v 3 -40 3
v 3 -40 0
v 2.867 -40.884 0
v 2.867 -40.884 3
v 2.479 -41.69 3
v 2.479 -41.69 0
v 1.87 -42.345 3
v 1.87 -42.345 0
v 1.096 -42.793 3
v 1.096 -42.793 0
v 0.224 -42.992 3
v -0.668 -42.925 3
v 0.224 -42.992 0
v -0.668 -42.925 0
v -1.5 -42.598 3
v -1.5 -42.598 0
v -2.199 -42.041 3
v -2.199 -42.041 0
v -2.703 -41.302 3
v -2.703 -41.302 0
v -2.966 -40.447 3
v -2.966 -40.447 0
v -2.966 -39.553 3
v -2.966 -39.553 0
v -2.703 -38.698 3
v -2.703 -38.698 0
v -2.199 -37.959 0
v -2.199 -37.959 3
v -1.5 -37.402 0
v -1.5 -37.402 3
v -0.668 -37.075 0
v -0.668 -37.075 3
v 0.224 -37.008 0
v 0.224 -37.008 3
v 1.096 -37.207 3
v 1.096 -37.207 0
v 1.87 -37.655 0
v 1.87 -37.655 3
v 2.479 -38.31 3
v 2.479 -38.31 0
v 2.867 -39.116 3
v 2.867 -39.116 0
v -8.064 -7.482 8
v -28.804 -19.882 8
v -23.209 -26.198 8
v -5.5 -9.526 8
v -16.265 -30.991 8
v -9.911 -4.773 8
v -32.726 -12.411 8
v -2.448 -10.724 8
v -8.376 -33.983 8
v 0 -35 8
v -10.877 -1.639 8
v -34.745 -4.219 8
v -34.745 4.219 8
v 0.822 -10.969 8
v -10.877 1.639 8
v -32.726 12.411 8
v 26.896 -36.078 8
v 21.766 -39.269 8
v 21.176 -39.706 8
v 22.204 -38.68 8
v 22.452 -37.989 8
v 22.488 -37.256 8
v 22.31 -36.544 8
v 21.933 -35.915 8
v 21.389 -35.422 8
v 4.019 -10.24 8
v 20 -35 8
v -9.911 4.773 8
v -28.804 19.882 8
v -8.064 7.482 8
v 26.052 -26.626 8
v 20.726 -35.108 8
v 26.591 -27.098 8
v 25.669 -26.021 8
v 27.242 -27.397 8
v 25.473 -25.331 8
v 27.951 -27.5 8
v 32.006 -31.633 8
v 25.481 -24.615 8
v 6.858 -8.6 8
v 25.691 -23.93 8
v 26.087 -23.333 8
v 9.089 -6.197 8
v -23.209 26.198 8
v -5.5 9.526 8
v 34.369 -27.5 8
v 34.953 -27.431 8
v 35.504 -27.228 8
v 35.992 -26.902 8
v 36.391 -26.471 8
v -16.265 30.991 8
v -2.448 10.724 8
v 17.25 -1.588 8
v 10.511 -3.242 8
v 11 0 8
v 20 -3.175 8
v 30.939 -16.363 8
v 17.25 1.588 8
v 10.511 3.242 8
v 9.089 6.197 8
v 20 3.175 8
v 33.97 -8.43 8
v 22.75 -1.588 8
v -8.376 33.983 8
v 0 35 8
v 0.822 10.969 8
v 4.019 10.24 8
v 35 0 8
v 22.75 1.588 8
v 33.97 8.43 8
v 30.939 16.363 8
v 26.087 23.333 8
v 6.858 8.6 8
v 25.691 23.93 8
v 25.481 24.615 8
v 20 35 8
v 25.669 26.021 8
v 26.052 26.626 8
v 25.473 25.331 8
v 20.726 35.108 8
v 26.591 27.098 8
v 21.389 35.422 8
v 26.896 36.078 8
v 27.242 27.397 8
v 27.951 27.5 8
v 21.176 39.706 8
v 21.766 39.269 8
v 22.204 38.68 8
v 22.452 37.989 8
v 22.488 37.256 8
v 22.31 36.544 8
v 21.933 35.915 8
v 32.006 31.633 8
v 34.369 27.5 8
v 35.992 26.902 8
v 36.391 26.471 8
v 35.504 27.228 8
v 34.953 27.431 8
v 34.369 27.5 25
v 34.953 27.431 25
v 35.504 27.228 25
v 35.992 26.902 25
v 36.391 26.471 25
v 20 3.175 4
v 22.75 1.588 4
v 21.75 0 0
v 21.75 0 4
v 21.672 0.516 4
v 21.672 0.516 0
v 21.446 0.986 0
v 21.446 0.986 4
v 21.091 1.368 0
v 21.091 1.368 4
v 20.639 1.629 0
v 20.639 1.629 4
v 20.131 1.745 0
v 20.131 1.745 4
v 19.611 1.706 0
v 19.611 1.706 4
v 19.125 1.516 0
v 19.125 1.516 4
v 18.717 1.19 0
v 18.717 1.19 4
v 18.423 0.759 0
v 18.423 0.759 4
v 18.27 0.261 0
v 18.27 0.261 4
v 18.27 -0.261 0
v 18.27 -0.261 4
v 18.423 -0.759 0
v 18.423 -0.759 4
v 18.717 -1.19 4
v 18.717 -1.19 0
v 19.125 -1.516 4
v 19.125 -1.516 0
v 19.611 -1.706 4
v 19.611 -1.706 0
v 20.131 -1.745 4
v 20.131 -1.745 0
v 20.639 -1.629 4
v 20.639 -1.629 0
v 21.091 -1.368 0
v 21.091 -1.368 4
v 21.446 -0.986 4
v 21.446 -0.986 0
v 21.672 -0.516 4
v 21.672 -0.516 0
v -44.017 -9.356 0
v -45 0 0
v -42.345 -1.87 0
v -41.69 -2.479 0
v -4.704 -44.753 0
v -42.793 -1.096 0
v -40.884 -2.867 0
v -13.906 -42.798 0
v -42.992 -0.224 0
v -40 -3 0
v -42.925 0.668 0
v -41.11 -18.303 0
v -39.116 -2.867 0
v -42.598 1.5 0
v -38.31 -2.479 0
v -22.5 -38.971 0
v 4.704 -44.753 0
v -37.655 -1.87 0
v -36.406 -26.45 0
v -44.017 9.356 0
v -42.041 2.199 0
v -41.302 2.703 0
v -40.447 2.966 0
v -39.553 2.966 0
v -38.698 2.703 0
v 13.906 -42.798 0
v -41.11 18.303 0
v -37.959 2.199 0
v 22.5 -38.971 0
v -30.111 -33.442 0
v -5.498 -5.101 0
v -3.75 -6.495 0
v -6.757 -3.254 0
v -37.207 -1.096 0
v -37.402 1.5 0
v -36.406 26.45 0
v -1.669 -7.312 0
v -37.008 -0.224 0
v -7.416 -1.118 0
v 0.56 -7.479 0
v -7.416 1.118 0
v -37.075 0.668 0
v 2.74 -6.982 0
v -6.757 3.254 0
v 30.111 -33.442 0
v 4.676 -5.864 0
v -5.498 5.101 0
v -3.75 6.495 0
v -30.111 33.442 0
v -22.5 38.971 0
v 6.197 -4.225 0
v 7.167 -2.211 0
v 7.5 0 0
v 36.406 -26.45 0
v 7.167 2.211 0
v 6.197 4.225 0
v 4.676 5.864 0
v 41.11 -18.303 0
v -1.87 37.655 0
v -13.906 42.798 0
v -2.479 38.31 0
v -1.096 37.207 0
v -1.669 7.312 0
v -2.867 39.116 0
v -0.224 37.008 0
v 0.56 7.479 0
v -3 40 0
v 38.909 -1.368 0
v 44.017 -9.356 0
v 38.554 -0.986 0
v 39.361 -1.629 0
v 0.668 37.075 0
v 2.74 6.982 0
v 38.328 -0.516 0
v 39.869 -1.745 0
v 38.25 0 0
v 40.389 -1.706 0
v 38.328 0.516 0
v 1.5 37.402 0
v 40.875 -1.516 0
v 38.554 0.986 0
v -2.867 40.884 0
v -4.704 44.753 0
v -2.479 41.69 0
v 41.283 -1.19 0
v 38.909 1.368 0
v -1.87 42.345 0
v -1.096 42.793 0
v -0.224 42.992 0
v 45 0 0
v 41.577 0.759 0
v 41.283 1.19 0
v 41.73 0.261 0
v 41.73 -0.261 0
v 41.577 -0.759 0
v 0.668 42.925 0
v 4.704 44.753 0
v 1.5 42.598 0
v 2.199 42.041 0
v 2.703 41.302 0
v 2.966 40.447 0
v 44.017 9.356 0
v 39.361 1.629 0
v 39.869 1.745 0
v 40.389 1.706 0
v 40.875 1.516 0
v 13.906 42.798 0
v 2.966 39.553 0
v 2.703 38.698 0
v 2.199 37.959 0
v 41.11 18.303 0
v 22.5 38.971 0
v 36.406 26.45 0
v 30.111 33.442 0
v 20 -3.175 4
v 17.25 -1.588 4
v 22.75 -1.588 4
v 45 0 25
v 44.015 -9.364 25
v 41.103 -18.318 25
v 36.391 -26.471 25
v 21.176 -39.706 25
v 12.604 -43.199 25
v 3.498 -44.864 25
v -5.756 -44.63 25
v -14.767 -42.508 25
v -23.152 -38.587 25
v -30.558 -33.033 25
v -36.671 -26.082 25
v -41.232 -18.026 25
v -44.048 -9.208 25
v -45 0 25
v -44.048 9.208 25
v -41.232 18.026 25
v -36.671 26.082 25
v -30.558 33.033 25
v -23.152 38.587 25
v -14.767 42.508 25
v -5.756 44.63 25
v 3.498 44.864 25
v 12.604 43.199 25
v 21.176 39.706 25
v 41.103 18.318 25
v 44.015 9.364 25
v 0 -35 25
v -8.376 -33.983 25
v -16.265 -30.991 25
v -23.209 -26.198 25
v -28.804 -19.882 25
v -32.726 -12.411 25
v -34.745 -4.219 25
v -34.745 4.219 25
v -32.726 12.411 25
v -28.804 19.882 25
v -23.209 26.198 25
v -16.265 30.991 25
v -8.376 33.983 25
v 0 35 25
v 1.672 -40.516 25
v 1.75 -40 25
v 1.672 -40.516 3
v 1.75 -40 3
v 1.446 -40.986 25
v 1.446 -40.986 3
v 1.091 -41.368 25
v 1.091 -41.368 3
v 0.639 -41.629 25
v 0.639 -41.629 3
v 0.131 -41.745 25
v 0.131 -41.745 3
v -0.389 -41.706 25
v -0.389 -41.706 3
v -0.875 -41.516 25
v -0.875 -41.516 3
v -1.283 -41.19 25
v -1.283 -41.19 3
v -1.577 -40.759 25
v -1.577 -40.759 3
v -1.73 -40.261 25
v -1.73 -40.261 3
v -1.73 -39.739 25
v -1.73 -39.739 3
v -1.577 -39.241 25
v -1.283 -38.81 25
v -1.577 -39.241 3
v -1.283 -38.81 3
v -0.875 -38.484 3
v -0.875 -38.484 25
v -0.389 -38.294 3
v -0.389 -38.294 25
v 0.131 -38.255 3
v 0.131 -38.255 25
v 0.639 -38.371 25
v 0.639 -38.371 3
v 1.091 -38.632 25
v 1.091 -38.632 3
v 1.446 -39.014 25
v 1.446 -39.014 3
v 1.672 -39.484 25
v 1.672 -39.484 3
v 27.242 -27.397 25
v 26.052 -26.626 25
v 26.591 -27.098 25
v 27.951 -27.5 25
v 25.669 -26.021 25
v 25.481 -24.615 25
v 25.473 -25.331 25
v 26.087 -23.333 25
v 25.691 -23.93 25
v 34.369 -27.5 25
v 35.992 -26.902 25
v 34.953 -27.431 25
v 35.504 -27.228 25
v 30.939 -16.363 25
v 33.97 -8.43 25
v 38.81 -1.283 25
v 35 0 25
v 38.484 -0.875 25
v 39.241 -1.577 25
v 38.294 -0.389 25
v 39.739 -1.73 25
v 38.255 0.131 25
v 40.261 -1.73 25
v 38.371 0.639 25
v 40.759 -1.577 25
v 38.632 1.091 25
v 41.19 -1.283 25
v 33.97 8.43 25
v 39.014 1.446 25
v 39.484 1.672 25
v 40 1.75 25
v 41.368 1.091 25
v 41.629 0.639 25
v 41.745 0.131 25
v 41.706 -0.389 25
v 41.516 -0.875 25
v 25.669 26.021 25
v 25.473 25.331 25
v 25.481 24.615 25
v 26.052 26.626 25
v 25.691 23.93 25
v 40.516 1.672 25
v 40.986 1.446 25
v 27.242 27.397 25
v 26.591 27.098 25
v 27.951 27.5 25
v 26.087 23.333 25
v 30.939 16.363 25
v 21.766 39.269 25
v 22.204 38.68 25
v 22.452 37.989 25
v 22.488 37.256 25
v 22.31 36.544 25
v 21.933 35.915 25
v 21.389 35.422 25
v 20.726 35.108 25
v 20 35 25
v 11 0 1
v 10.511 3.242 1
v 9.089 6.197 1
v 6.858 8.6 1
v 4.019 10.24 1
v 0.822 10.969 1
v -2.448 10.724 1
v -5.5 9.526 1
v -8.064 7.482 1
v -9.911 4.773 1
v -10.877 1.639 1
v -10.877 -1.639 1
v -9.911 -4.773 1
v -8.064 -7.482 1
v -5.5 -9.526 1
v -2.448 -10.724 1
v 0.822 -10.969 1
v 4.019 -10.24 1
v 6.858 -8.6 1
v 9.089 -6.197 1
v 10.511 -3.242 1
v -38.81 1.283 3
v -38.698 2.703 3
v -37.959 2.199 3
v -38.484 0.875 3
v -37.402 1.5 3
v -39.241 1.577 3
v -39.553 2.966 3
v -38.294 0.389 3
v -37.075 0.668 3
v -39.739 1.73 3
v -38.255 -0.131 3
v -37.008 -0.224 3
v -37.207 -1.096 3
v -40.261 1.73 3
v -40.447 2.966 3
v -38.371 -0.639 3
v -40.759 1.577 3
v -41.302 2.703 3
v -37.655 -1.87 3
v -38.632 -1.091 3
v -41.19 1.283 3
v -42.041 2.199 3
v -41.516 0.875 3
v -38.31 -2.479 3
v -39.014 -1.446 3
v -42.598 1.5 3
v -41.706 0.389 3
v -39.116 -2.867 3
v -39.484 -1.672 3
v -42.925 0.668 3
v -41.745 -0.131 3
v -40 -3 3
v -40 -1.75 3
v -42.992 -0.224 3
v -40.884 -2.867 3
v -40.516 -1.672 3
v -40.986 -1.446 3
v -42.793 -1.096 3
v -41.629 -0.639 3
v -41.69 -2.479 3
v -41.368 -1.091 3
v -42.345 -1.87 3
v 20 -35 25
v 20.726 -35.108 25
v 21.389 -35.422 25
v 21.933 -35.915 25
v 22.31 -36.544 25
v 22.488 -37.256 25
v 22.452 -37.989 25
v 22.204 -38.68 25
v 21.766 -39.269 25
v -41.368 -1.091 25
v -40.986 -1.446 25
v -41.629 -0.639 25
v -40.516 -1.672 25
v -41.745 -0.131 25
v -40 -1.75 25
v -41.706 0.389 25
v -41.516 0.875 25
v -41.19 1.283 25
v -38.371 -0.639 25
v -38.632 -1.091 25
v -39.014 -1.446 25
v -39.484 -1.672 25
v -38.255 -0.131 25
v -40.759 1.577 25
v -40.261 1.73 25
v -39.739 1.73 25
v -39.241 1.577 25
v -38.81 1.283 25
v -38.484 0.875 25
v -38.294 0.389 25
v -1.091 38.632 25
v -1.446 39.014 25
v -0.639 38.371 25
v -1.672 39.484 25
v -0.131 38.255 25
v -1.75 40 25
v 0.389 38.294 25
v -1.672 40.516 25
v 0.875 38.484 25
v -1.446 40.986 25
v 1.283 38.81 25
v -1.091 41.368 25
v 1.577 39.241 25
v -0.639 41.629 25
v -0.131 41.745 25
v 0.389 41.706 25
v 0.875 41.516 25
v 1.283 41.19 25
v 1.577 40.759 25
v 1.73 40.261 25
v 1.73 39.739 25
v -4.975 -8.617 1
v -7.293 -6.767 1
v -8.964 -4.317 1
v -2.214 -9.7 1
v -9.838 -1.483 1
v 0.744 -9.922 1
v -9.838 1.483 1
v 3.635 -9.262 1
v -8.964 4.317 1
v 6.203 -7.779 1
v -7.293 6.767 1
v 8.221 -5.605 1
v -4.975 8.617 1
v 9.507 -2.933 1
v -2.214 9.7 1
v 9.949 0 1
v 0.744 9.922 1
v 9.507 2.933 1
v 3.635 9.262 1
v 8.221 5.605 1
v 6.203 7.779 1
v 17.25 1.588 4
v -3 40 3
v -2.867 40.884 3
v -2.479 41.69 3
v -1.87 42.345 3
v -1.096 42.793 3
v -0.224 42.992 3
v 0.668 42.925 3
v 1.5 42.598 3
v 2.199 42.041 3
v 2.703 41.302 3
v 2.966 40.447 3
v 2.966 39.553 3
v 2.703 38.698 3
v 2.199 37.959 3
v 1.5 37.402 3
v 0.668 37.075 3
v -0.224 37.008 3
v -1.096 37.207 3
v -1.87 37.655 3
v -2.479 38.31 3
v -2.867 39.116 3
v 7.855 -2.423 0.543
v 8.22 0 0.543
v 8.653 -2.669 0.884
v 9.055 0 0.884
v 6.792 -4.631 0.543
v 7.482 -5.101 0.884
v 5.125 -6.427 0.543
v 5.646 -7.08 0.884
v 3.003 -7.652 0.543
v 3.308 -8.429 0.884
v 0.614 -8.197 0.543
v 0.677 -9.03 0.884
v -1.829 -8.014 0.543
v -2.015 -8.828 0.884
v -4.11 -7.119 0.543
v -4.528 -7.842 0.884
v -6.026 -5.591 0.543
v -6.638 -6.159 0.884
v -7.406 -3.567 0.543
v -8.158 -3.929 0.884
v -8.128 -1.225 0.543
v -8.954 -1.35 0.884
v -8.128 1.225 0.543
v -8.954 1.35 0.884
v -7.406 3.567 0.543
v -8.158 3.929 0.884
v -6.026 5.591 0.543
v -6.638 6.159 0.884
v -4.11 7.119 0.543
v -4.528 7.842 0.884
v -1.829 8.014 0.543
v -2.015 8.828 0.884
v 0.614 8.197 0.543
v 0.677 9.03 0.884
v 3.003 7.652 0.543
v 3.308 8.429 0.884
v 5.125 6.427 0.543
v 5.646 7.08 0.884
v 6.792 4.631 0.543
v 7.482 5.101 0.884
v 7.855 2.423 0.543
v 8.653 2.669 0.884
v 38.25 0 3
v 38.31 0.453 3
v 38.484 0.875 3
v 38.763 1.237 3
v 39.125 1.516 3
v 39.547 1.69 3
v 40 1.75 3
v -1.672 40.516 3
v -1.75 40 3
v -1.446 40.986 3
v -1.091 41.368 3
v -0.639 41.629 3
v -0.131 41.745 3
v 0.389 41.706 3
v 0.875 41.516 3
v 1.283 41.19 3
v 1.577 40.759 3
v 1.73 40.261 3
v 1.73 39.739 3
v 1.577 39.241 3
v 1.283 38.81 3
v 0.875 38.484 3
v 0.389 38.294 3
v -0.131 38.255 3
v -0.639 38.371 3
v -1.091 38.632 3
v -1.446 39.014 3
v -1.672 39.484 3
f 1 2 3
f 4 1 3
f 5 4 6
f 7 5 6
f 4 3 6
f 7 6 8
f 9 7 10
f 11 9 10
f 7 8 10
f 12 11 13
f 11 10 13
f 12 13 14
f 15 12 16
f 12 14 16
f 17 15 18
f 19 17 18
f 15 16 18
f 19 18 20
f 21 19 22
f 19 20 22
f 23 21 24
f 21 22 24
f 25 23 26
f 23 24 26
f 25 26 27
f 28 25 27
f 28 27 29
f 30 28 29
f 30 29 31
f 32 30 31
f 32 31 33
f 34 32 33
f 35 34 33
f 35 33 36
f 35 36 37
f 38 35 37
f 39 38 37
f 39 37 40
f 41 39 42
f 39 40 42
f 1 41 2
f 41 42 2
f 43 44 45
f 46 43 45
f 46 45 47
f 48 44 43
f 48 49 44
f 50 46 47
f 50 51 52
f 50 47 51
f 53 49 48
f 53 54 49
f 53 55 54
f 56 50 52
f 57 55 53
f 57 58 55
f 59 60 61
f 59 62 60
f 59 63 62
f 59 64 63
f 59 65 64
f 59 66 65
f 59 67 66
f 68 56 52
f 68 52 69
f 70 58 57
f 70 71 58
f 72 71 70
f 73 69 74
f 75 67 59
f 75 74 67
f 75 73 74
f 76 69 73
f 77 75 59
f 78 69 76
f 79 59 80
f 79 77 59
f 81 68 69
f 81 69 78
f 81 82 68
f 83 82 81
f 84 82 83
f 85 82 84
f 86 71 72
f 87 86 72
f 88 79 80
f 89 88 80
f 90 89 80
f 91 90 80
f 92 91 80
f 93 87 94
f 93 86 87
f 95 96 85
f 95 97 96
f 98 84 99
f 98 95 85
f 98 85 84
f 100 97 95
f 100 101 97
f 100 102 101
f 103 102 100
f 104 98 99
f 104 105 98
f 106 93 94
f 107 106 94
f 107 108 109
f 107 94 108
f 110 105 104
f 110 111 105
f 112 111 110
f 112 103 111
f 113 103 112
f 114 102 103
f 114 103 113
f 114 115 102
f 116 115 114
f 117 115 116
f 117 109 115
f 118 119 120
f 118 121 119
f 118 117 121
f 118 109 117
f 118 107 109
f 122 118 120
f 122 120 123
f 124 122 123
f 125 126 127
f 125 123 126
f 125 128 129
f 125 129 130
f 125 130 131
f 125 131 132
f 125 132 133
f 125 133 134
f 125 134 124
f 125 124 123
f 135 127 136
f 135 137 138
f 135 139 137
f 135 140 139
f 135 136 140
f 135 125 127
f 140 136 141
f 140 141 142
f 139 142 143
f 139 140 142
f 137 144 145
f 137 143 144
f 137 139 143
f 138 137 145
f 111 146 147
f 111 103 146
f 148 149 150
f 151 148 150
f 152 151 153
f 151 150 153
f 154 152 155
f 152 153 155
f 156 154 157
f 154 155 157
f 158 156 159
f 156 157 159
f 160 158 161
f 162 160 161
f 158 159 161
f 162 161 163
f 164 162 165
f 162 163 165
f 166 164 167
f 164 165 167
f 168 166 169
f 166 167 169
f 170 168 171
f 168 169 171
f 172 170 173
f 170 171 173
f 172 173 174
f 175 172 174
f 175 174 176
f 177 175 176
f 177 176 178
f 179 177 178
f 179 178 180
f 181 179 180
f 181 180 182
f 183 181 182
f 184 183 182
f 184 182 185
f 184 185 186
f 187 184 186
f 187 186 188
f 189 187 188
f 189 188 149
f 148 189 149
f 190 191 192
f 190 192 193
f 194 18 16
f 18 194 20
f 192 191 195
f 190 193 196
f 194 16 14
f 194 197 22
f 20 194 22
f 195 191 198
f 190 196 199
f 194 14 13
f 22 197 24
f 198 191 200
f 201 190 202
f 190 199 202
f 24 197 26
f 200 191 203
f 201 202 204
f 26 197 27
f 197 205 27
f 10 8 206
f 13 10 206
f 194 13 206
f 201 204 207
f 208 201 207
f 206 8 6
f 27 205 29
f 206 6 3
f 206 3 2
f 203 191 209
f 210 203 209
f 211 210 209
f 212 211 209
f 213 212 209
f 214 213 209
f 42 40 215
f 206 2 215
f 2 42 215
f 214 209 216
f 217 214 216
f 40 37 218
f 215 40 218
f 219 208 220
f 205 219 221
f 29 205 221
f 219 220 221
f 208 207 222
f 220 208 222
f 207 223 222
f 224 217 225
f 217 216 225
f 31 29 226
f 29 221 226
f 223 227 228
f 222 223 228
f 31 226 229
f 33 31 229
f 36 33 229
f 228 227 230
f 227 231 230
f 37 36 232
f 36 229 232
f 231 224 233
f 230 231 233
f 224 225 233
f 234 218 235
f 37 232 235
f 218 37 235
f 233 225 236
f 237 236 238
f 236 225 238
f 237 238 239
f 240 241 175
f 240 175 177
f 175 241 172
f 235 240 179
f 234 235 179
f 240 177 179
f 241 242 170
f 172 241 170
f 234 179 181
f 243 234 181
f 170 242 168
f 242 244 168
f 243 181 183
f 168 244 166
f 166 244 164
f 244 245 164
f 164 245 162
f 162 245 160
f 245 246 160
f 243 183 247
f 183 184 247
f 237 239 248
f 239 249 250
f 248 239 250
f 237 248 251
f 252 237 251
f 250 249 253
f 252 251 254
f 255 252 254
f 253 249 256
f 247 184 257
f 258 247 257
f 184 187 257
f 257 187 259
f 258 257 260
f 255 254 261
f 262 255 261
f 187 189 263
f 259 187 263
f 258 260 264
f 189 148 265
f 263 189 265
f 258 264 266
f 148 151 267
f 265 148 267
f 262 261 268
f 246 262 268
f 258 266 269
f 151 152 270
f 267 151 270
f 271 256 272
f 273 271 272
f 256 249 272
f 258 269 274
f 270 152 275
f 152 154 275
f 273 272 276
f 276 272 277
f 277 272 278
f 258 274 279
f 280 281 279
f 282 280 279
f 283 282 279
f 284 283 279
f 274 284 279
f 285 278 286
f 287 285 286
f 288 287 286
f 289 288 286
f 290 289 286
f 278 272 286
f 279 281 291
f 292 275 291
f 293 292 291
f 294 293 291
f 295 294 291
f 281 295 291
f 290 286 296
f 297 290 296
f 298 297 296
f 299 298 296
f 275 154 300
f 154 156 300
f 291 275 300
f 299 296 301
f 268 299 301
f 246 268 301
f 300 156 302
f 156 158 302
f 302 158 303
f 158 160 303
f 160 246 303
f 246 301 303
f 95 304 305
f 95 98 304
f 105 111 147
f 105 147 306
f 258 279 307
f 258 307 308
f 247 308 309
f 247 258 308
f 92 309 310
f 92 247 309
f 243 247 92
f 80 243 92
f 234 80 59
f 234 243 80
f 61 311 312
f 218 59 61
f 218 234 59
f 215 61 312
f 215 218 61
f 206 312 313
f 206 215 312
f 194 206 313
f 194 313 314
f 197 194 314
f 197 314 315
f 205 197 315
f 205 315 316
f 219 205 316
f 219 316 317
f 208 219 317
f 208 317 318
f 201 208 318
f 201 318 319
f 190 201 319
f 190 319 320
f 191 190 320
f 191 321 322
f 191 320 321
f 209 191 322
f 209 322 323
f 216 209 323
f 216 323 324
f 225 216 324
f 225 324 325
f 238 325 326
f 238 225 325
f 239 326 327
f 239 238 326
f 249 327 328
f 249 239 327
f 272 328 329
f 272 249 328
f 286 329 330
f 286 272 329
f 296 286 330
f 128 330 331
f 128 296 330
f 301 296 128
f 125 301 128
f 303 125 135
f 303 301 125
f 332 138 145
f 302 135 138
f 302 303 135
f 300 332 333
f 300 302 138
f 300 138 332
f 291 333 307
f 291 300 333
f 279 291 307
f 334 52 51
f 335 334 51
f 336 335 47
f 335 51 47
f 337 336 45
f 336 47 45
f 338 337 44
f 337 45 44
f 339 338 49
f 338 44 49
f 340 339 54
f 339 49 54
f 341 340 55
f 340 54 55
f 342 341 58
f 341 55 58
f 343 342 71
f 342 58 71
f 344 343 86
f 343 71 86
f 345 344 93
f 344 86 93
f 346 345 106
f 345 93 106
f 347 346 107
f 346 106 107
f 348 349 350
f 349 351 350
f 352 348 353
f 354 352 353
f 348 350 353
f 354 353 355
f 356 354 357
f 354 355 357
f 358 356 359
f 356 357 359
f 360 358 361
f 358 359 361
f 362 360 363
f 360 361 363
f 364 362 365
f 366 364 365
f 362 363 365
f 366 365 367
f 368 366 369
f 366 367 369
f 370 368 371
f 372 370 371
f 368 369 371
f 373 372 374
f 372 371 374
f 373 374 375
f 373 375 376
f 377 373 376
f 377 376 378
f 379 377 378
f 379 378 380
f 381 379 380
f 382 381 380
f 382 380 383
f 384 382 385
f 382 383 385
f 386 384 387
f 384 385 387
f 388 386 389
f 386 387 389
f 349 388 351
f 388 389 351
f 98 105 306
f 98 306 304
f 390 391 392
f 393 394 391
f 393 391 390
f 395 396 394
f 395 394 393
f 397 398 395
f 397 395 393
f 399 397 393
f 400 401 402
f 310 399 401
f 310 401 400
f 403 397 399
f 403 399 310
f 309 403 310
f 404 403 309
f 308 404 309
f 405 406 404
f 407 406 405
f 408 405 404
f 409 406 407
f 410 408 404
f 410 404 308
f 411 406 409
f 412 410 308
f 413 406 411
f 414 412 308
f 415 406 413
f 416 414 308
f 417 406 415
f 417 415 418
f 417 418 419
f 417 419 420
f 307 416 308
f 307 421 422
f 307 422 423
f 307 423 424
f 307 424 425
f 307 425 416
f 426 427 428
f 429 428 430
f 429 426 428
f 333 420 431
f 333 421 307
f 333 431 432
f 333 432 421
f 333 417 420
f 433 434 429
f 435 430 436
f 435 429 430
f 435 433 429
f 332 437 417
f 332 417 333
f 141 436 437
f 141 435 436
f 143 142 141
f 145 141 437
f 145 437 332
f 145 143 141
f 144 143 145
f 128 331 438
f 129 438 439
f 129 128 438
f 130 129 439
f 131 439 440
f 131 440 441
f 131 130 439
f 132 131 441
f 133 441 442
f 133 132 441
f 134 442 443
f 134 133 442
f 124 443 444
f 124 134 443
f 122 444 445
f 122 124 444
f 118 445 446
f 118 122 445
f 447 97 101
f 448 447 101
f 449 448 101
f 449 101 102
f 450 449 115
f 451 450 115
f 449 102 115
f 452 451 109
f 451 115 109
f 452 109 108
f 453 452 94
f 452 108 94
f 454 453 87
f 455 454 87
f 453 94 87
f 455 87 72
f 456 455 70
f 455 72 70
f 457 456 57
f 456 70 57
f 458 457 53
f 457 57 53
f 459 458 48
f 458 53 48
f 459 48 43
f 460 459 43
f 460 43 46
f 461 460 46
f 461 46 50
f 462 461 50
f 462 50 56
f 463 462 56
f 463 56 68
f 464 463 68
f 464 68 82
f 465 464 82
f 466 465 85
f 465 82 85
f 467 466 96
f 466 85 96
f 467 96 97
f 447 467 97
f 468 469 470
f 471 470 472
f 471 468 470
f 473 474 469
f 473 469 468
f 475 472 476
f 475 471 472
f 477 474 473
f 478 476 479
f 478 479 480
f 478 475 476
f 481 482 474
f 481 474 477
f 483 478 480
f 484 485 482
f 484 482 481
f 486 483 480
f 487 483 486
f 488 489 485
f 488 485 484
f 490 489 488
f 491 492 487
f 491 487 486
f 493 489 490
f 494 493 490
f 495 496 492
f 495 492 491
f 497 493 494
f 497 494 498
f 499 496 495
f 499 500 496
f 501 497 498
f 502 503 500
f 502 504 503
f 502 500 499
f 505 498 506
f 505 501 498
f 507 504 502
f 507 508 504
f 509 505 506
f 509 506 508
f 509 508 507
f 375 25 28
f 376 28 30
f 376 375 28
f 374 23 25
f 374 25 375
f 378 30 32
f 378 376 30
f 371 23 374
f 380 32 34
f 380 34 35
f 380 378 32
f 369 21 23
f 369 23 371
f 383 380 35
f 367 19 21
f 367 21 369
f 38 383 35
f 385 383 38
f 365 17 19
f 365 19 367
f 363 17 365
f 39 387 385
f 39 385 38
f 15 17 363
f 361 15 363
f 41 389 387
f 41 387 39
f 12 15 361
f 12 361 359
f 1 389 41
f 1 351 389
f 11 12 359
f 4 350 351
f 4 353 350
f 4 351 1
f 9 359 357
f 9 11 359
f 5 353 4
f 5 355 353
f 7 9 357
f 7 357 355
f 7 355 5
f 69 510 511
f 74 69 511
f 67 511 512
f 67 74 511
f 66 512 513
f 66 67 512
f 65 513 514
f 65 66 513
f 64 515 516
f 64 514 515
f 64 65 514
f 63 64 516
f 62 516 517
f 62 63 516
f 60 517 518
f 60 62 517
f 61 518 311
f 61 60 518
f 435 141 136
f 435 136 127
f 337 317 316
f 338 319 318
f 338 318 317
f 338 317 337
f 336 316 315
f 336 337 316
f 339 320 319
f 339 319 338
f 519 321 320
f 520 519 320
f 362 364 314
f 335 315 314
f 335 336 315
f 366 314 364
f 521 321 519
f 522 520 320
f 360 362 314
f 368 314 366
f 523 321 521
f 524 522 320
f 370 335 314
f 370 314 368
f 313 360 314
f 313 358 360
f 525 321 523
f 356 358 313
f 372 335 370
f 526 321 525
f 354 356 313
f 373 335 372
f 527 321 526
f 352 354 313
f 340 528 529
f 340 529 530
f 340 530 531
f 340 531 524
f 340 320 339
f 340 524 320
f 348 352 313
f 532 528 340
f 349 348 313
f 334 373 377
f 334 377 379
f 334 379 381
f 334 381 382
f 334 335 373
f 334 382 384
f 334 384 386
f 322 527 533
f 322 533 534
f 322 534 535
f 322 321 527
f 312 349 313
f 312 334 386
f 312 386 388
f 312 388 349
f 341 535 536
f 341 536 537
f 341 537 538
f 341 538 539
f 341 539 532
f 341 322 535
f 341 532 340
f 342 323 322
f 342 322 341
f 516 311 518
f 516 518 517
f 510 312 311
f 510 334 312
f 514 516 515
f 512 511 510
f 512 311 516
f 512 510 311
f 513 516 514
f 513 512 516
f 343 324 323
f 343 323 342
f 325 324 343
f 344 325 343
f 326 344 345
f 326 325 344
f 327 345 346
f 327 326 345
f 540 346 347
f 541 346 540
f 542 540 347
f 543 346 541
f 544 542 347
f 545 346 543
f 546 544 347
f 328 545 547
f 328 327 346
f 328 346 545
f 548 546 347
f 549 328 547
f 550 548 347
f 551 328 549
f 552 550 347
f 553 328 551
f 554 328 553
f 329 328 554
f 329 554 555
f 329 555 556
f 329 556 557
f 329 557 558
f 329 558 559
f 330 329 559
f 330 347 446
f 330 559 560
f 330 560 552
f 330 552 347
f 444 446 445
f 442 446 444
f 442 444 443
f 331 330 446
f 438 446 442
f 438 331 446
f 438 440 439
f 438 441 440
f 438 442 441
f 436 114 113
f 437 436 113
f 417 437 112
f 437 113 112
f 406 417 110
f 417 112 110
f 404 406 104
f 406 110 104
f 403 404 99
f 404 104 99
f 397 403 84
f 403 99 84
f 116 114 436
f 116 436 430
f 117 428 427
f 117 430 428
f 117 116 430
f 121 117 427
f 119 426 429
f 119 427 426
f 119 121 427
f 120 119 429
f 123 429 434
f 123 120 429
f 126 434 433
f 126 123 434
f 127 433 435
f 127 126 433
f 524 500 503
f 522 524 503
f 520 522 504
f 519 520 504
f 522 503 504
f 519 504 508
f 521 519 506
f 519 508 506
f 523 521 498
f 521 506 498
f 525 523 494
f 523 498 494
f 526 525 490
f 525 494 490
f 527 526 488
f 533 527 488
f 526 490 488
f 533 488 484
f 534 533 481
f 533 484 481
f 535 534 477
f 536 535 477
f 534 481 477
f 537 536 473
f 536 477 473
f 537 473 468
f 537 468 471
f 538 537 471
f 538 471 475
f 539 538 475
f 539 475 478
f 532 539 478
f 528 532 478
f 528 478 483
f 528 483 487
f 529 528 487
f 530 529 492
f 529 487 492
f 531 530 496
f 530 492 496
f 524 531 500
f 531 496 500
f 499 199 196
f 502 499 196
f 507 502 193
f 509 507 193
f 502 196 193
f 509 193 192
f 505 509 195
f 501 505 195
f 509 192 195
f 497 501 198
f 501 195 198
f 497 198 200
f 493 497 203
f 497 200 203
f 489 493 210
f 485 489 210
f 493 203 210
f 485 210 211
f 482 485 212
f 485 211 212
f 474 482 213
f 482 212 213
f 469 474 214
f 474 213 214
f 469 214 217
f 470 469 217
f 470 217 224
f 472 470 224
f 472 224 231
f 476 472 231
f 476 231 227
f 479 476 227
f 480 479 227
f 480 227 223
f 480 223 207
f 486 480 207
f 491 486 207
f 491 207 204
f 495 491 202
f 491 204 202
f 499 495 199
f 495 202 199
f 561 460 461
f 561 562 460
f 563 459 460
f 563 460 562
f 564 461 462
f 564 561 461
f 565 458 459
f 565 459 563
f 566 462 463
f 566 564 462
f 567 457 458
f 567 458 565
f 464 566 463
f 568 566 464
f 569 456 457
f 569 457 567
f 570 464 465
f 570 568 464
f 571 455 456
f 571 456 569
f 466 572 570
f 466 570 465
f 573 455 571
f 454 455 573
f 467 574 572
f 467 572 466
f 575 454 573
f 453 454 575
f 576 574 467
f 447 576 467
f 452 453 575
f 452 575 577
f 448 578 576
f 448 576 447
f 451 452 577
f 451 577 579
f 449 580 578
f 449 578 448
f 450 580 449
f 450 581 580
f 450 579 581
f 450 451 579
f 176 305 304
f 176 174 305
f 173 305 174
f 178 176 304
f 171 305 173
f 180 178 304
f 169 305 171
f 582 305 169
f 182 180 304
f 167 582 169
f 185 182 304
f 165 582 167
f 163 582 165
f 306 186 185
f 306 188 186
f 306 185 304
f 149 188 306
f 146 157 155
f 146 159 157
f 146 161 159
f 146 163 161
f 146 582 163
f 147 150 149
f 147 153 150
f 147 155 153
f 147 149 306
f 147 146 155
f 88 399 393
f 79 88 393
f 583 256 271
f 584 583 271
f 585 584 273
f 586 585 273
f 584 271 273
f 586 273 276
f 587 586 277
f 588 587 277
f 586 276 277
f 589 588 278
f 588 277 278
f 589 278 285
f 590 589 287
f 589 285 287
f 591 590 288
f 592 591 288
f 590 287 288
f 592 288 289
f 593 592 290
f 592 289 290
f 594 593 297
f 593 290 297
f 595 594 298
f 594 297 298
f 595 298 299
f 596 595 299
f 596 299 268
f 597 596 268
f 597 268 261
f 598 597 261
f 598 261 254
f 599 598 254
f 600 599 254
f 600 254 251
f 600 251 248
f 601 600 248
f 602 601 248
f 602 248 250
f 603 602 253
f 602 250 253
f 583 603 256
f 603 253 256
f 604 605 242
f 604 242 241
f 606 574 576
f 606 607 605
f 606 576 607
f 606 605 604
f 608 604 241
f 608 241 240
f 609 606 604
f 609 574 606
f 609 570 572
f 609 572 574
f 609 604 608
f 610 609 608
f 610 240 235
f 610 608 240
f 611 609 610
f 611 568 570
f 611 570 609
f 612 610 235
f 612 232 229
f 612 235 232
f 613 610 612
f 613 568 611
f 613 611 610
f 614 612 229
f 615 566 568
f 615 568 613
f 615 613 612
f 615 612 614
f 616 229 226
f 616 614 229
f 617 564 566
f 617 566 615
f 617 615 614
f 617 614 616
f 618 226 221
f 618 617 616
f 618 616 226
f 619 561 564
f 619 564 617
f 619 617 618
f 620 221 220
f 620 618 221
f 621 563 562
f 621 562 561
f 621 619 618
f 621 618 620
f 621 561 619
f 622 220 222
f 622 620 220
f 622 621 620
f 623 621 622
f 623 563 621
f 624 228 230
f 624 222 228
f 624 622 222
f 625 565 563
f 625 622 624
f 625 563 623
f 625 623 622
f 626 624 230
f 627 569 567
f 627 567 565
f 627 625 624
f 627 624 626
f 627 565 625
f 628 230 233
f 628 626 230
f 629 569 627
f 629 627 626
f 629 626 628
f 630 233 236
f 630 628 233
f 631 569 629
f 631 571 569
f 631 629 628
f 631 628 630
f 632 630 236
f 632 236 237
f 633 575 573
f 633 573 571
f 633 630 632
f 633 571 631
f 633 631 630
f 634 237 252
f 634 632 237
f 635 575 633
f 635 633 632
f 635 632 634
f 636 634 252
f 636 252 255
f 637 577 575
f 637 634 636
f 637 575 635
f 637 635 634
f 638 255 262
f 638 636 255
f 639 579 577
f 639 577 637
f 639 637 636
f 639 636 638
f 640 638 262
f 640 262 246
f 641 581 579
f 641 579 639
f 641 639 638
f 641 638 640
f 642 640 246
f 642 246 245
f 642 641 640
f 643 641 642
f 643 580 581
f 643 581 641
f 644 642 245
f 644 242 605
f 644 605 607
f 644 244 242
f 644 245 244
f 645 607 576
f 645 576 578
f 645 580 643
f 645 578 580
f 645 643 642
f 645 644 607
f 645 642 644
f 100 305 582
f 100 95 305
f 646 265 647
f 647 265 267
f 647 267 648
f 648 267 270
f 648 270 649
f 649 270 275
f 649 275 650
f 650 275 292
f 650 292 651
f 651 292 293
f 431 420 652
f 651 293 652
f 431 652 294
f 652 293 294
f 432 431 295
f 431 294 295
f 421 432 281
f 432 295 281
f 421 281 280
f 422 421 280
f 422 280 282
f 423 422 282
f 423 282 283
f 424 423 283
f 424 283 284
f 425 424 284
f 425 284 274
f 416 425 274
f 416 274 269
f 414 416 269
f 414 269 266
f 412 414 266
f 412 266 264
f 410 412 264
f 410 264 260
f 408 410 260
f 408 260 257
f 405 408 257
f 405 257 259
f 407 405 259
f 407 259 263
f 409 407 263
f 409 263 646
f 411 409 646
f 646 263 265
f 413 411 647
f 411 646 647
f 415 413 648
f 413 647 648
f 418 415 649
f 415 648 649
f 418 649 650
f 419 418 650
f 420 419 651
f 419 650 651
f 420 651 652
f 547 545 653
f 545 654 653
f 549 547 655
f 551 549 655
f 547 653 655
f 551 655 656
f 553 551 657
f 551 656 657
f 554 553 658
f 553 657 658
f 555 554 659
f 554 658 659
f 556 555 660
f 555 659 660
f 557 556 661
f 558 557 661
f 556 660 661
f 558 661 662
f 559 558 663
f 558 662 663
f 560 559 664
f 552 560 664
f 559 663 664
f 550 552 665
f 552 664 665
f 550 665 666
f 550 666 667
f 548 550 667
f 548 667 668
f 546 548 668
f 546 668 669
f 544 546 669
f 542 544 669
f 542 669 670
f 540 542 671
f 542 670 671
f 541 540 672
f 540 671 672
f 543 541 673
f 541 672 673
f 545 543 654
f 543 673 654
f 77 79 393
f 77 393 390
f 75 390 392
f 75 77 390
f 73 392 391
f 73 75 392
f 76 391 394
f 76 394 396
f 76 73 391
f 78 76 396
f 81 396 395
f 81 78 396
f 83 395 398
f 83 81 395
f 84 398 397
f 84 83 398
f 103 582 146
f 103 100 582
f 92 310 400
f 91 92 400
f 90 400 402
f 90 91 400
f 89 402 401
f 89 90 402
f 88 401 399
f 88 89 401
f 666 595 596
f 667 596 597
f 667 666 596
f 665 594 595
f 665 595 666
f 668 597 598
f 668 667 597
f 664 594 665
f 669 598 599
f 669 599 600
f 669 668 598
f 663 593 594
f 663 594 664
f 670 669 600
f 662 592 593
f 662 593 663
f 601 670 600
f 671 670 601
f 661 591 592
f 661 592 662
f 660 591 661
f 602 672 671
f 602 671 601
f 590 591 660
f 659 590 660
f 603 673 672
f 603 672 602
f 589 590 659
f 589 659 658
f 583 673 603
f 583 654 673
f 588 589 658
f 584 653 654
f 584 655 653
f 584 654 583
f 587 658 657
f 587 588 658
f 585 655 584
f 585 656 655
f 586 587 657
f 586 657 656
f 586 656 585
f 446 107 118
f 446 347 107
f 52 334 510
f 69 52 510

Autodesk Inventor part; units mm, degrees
ref_plane "YZ Plane" through (0, 0, 0) normal (1, 0, 0) x (0, 1, 0)
ref_plane "XZ Plane" through (0, 0, 0) normal (0, 1, 0) x (-1, 0, 0)
ref_plane "XY Plane" through (0, 0, 0) normal (0, 0, 1) x (1, 0, 0)
sketch "Sketch1" plane through (0, 0, 0) normal (0, 0, 1) x (1, 0, 0)
  circle A0 centre (0, 0) radius 45
  circle A1 centre (0, 0) radius 35
  dimension "d0" = 90
  dimension "d2" = 70
extrude "Extrusion1" add sketch "Sketch1" along normal blind 25
sketch "Sketch2" plane through (0, 0, 0) normal (0, 0, -1) x (-1, 0, 0)
  circle A0 centre (0, 0) radius 35 projected
extrude "Extrusion2" add sketch "Sketch2" against normal blind 8
sketch "Sketch3" plane through (0, 0, 8) normal (0, 0, 1) x (1, 0, 0)
  circle A0 centre (0, 0) radius 35 projected
  circle A1 centre (0, 0) radius 7.5
  dimension "d7" = 15
extrude "Extrusion3" cut sketch "Sketch3" against normal through all contours A1
sketch "Sketch4" plane through (0, 0, 8) normal (0, 0, 1) x (1, 0, 0)
  circle A0 centre (0, 0) radius 7.5 projected
  circle A1 centre (0, 0) radius 35 projected
  circle A2 centre (0, 0) radius 11
  dimension "d11" = 22
extrude "Extrusion4" cut sketch "Sketch4" against normal blind 7 contours A2
sketch "Sketch5" plane through (0, 0, 25) normal (0, 0, 1) x (1, 0, 0)
  circle A0 centre (0, 0) radius 35 construction
  circle A1 centre (0, 0) radius 45 construction
  circle A2 centre (0, 0) radius 32.5 construction
  line L0 (0, 35) -> (35.6195, 35)
  line L1 (35.6195, 35) -> (35.6195, 27.5)
  line L2 (35.6195, 27.5) -> (0, 27.5)
  line L3 (0, 27.5) -> (0, 35)
  line L4 (0, -35) -> (35.6195, -35)
  line L5 (35.6195, -35) -> (35.6195, -27.5)
  line L6 (35.6195, -27.5) -> (0, -27.5)
  line L7 (0, -27.5) -> (0, -35)
  dimension "d15" = 65
  dimension "d17" = 7.5
extrude "Extrusion5" cut sketch "Sketch5" against normal up to surface (17 mm away)
fillet "Fillet1" radius 2.5 6 edges at (28.2843, -35, 16.5) (35.6195, -27.5, 16.5) (21.6506, -27.5, 16.5) (21.6506, 27.5, 16.5) (35.6195, 27.5, 16.5) (28.2843, 35, 16.5)
sketch "Sketch6" plane through (0, 0, 0) normal (0, 0, -1) x (-1, 0, 0)
  circle A0 centre (0, 0) radius 7.5 projected
  circle A1 centre (0, 0) radius 45 projected
  circle A2 centre (0, 40) radius 1.75
  dimension "d21" = 40
  dimension "d22" = 3.5
extrude "Extrusion6" cut sketch "Sketch6" against normal through all contours A2
sketch "Sketch7" plane through (0, 0, 0) normal (0, 0, -1) x (-1, 0, 0)
  circle A0 centre (0, 40) radius 1.75 projected
  circle A1 centre (0, 40) radius 3
  dimension "d25" = 6
extrude "Extrusion7" cut sketch "Sketch7" against normal blind 3
pattern_circular "Circular Pattern1" count 4 over 360 about axis through (0, 0, 8) along (0, 0, -1) of "Extrusion7", "Extrusion6"
sketch "Sketch8" plane through (0, 0, 8) normal (0, 0, 1) x (1, 0, 0)
  arc A0 (0, 35) -> (0, -35) centre (0, 0) ccw projected
  circle A1 centre (20, 0) radius 1.75
  dimension "d32" = 20
  dimension "d34" = 3.5
extrude "Extrusion8" cut sketch "Sketch8" against normal through all
sketch "Sketch9" plane through (0, 0, 8) normal (0, 0, 1) x (1, 0, 0)
  circle A0 centre (20, 0) radius 1.75 projected
  line L0 (20, 3.1754) -> (22.75, 1.5877)
  line L1 (22.75, 1.5877) -> (22.75, -1.5877)
  line L2 (22.75, -1.5877) -> (20, -3.1754)
  line L3 (20, -3.1754) -> (17.25, -1.5877)
  line L4 (17.25, -1.5877) -> (17.25, 1.5877)
  line L5 (17.25, 1.5877) -> (20, 3.1754)
  dimension "d37" = 5.5
extrude "Extrusion9" cut sketch "Sketch9" against normal blind 4
sketch "Sketch10" plane through (0, 0, 0) normal (0, 0, -1) x (-1, 0, 0)
  circle A0 centre (-40, 0) radius 3 projected
  circle A1 centre (-40, 0) radius 1.75 projected
extrude "Extrusion10" add sketch "Sketch10" against normal up to next
fillet "Fillet2" radius 3.5 1 edges at (-7.5, 0, 1)
properties part number "offset shield"
